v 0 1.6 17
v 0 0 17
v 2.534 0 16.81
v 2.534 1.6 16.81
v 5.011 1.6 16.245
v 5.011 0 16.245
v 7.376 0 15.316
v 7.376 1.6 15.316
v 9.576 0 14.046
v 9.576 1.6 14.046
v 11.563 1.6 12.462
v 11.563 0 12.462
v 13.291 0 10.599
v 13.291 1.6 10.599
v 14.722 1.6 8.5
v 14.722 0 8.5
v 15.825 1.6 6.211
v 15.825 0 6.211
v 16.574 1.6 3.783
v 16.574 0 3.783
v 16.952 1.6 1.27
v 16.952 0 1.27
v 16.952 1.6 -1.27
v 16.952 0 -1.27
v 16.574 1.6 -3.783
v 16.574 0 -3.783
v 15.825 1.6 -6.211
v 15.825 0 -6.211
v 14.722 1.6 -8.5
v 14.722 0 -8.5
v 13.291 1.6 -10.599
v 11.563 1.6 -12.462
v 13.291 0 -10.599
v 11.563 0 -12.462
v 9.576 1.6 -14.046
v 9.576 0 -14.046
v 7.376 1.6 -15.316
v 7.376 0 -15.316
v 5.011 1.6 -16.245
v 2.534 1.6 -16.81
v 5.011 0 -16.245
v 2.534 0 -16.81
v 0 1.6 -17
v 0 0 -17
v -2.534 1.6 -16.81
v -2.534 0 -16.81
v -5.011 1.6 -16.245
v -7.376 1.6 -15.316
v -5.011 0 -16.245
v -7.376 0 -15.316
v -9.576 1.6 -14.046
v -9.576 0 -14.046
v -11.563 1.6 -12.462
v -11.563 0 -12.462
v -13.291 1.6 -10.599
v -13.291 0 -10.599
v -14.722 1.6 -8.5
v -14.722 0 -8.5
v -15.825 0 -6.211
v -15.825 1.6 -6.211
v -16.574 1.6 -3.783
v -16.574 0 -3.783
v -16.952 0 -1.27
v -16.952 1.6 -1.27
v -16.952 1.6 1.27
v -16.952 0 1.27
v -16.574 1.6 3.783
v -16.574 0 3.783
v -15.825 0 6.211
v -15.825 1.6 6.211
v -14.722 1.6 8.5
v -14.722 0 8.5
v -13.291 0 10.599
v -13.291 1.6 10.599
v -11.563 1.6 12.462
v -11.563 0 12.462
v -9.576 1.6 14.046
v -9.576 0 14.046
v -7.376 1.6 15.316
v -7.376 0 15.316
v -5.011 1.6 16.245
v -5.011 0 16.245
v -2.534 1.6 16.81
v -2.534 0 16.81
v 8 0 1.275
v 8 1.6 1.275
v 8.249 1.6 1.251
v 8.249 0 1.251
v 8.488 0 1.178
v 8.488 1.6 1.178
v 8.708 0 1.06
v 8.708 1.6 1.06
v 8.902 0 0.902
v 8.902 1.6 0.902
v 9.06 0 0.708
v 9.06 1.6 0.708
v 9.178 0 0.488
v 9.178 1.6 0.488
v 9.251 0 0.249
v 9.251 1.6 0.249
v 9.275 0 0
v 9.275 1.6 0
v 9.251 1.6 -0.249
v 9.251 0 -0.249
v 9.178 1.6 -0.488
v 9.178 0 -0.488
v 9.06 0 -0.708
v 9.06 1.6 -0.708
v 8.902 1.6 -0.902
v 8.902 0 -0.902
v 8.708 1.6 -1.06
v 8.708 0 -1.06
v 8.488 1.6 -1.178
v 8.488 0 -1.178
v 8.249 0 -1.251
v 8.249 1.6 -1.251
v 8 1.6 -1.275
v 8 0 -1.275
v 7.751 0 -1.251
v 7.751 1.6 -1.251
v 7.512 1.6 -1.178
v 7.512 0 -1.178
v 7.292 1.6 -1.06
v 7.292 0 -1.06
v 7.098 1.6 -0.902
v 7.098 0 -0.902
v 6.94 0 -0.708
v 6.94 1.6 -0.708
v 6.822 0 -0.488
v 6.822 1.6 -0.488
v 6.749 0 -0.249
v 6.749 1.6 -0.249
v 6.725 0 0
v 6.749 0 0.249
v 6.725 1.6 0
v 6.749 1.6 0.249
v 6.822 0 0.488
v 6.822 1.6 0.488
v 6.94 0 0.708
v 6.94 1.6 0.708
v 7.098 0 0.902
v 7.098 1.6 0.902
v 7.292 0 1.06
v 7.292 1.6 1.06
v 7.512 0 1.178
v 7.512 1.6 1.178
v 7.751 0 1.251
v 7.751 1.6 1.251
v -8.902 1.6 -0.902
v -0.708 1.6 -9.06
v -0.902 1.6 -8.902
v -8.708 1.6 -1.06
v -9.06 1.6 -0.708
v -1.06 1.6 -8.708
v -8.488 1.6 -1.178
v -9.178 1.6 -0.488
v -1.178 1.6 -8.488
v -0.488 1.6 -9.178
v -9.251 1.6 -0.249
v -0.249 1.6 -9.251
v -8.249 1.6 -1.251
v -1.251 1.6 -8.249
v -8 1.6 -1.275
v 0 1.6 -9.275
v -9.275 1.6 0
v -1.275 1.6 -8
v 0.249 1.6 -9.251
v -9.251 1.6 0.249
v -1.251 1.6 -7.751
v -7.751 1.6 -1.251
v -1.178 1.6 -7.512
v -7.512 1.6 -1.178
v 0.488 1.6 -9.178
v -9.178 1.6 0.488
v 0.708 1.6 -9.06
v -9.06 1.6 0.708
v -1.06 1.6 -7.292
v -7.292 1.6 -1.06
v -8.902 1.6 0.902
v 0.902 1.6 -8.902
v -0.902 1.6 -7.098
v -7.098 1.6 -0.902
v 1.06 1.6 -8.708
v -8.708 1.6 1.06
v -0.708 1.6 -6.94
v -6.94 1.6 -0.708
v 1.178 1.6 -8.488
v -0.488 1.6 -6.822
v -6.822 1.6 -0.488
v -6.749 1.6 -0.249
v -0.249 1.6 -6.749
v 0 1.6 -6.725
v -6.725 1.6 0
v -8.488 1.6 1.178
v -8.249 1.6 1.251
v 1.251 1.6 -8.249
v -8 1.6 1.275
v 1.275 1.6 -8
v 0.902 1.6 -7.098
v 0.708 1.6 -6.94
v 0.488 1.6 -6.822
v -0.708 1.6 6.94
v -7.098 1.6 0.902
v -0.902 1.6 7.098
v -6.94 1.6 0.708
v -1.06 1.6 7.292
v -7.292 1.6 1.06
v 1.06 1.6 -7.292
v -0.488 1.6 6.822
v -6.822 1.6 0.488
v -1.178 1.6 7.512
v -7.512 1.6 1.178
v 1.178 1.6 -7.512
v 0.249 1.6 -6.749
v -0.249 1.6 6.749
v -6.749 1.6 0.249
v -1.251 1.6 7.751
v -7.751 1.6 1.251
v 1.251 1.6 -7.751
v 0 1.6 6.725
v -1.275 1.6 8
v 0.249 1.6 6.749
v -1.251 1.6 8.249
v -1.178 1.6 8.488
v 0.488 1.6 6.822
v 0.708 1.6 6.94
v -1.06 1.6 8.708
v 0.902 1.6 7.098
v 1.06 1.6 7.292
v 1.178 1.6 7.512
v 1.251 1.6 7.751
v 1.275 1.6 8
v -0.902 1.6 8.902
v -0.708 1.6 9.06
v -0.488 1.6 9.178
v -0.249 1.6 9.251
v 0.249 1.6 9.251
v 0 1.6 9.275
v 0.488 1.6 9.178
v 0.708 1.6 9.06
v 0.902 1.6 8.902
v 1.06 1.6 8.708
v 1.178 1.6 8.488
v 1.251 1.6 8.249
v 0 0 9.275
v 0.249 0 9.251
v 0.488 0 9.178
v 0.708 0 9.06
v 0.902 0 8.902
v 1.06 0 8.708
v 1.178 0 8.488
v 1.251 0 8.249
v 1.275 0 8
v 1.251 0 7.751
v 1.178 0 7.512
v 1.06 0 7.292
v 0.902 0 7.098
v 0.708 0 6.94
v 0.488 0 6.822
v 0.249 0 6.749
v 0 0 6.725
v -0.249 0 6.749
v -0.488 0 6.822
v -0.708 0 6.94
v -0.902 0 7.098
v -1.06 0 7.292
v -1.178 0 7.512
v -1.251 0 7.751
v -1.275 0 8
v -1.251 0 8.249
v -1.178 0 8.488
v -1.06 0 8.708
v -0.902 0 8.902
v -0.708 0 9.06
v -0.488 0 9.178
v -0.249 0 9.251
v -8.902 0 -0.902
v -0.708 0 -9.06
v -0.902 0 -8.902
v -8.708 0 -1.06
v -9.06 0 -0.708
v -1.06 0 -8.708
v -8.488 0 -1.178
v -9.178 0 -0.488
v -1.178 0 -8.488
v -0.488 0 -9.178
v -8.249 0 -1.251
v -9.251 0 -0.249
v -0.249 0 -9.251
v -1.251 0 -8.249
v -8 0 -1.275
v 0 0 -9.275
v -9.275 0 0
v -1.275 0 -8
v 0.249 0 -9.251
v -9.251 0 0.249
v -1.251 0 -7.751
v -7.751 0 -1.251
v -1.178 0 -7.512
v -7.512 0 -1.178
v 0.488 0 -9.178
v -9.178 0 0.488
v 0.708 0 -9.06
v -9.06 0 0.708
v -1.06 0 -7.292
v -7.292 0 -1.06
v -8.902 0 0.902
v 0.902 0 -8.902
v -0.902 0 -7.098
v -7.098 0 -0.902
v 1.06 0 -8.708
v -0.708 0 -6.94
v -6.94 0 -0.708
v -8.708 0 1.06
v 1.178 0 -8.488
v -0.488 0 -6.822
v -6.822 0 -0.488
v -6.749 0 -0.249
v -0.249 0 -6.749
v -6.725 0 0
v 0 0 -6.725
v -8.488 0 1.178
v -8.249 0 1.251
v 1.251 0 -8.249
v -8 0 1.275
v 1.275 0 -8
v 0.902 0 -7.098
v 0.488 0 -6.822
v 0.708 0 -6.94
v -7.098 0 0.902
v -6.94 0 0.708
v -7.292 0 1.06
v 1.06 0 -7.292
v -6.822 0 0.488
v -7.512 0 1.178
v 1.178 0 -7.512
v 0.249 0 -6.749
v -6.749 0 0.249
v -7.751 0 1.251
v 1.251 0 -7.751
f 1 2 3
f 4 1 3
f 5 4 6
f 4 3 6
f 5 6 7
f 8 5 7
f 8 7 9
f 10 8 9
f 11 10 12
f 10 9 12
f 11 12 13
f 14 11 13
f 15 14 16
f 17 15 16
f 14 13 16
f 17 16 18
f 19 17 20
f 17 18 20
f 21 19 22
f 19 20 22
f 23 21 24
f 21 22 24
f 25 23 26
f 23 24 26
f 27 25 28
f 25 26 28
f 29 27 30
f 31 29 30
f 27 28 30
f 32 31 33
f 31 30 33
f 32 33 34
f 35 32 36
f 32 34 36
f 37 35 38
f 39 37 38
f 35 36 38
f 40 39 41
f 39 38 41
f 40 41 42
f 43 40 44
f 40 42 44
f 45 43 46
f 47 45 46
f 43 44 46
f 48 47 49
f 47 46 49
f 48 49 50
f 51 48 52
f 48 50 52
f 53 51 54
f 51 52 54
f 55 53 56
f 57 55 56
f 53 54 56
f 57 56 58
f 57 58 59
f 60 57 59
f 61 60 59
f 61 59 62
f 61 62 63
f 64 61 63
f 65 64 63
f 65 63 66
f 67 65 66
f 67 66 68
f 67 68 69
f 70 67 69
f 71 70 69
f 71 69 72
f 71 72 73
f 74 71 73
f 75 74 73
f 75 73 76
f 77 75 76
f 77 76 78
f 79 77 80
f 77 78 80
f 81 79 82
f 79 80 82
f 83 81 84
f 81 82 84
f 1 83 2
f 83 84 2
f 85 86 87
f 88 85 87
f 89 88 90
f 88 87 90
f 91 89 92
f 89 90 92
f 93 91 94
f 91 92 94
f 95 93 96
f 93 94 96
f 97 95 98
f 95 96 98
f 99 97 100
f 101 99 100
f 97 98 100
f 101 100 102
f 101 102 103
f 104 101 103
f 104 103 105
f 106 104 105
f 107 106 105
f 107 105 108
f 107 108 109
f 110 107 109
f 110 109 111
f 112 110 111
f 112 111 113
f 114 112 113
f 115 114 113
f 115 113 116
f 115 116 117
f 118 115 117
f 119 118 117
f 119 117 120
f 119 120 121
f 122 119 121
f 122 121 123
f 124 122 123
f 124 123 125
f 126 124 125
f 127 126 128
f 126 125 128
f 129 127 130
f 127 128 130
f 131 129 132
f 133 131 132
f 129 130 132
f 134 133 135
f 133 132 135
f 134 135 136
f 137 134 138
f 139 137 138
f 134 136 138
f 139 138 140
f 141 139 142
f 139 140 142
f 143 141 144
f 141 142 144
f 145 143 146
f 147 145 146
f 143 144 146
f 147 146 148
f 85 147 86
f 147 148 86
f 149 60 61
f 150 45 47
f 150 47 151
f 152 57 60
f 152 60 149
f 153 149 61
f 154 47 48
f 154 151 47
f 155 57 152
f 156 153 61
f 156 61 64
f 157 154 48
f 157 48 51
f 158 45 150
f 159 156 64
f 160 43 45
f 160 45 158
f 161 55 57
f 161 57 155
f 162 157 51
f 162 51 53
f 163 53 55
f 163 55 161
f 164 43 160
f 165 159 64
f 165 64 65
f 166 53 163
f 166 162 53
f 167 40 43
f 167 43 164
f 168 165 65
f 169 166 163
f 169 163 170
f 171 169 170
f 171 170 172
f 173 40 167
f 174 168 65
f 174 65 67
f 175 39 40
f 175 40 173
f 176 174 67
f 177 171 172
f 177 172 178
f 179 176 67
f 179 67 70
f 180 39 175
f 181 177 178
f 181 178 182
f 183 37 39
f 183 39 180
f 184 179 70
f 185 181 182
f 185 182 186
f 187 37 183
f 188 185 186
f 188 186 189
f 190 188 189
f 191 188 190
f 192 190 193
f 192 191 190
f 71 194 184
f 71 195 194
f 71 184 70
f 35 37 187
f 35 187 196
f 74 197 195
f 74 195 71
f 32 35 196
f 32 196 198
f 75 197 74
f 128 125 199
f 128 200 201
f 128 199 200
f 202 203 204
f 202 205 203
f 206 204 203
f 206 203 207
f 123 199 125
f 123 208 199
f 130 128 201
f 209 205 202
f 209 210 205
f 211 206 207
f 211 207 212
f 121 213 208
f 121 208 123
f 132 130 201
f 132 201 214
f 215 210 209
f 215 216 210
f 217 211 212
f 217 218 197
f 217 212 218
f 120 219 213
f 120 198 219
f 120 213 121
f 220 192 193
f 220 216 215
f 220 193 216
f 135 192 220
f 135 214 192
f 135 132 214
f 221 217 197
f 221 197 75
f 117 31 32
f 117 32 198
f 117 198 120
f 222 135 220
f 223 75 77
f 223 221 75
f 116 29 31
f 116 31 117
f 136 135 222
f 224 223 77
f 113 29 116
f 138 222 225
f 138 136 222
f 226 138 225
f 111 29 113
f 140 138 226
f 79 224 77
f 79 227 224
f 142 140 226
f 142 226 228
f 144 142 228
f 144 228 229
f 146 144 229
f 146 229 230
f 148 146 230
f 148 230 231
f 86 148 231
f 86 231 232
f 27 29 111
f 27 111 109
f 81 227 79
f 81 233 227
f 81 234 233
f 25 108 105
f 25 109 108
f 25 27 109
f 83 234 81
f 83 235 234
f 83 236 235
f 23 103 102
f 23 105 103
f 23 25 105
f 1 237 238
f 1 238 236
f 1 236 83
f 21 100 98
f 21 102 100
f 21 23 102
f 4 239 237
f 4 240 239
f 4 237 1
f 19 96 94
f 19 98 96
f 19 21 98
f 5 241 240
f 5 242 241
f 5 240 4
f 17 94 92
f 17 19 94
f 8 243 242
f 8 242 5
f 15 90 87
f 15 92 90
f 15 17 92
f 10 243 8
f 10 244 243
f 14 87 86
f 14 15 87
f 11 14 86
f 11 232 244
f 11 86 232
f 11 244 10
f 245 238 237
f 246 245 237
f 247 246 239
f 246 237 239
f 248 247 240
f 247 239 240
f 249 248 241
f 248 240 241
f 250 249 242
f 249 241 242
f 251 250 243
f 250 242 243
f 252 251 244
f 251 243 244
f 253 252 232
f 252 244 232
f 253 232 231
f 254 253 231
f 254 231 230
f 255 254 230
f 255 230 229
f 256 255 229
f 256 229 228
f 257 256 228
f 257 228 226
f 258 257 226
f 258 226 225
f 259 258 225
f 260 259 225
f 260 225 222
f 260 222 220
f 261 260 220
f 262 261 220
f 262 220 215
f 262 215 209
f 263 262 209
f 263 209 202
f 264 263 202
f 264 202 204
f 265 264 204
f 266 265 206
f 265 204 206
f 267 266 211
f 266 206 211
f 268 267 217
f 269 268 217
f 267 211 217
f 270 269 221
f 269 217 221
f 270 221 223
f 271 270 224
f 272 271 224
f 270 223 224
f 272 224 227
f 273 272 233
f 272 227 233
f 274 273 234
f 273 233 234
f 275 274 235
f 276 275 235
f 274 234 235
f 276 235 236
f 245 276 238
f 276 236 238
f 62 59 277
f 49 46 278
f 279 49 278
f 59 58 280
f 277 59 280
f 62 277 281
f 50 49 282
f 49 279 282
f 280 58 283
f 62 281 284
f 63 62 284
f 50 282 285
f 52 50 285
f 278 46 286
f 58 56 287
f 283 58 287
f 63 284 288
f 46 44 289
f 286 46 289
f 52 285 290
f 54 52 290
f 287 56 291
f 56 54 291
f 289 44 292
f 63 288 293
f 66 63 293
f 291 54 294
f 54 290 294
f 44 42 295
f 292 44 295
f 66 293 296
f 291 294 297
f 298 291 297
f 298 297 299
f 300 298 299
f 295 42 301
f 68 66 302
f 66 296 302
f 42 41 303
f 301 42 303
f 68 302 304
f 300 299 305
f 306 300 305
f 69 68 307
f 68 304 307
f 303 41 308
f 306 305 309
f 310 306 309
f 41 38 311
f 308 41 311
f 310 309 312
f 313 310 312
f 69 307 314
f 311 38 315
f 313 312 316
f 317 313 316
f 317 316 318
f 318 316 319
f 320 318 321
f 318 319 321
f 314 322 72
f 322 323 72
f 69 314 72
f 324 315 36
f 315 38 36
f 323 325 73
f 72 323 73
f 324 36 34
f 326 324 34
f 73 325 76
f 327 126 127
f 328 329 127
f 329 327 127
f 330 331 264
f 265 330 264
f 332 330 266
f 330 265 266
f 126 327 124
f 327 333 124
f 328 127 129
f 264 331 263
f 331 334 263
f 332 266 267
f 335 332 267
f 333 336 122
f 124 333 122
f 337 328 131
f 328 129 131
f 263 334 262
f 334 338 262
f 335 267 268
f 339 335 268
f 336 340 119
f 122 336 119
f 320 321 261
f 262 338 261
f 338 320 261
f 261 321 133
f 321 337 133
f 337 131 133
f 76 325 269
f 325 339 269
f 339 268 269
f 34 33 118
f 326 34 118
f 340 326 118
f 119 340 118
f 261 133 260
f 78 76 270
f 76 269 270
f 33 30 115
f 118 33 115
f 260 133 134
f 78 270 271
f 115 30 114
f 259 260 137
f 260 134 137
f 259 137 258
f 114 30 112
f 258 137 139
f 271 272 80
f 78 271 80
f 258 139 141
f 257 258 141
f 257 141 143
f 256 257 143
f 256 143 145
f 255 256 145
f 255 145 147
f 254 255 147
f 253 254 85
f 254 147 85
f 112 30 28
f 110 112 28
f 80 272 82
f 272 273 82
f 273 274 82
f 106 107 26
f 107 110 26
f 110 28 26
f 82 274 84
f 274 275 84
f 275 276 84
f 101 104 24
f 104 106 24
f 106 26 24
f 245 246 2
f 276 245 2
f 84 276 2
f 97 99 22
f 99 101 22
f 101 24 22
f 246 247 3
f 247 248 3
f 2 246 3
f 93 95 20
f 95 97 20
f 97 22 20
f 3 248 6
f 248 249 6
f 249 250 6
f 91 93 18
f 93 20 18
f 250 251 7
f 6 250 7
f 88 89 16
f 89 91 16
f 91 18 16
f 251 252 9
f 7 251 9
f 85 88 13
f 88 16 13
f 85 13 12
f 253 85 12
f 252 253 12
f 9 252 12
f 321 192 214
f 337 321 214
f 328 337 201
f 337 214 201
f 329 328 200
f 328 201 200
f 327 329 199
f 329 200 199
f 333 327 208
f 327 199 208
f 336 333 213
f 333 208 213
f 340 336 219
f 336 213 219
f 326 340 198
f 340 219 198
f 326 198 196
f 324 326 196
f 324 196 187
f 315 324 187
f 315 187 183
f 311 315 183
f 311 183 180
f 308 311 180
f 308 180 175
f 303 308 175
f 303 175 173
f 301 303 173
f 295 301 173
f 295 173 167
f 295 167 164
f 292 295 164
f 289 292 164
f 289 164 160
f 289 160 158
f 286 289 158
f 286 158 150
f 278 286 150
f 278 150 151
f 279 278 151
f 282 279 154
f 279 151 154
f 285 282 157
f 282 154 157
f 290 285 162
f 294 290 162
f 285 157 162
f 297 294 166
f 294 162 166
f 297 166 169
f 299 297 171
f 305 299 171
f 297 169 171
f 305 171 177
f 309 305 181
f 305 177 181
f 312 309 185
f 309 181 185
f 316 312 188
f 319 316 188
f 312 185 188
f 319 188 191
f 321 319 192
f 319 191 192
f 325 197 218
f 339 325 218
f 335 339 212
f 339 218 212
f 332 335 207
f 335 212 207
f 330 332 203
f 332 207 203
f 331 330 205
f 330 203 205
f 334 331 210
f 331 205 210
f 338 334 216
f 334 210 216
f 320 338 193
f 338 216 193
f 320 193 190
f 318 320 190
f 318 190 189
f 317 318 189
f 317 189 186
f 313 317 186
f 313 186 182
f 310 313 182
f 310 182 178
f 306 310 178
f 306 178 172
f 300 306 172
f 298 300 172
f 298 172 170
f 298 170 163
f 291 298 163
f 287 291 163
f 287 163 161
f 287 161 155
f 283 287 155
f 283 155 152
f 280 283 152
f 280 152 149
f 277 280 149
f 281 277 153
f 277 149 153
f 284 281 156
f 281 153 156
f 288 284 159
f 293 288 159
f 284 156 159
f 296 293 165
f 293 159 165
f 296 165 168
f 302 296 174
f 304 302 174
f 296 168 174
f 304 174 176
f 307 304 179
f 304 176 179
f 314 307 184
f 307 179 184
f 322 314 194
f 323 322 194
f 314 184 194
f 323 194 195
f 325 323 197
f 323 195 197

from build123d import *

# Parameters (mm, degrees)
SKETCH_1_R          = 17
EXTRUDE_1_DEPTH     = 1.6
SKETCH_2_R          = 1.275
CUT_EXTRUDE_1_DEPTH = 25.09481272


with BuildPart() as part:
    # 草图1 → 凸台-拉伸1 (new body)
    with BuildSketch(Plane(origin=(0, 0, 0), x_dir=(1, 0, 0), z_dir=(0, 1, 0))):
        with Locations(Location((0, 0, 0), (0, 0, 270))):
            Circle(SKETCH_1_R)
    extrude(amount=EXTRUDE_1_DEPTH)

    # 草图2 → 切除-拉伸1 (cut, through all)
    with BuildSketch(Plane(origin=(0, 1.6, 0), x_dir=(1, 0, 0), z_dir=(0, 1, 0))):
        with Locations(Location((8, 0, 0), (0, 0, 270))):
            Circle(SKETCH_2_R)
        with Locations(Location((0, -8, 0), (0, 0, 270))):
            Circle(SKETCH_2_R)
        with Locations(Location((-8, 0, 0), (0, 0, 270))):
            Circle(SKETCH_2_R)
        with Locations(Location((0, 8, 0), (0, 0, 270))):
            Circle(SKETCH_2_R)
    extrude(amount=-CUT_EXTRUDE_1_DEPTH, mode=Mode.SUBTRACT)


solid = part.part
